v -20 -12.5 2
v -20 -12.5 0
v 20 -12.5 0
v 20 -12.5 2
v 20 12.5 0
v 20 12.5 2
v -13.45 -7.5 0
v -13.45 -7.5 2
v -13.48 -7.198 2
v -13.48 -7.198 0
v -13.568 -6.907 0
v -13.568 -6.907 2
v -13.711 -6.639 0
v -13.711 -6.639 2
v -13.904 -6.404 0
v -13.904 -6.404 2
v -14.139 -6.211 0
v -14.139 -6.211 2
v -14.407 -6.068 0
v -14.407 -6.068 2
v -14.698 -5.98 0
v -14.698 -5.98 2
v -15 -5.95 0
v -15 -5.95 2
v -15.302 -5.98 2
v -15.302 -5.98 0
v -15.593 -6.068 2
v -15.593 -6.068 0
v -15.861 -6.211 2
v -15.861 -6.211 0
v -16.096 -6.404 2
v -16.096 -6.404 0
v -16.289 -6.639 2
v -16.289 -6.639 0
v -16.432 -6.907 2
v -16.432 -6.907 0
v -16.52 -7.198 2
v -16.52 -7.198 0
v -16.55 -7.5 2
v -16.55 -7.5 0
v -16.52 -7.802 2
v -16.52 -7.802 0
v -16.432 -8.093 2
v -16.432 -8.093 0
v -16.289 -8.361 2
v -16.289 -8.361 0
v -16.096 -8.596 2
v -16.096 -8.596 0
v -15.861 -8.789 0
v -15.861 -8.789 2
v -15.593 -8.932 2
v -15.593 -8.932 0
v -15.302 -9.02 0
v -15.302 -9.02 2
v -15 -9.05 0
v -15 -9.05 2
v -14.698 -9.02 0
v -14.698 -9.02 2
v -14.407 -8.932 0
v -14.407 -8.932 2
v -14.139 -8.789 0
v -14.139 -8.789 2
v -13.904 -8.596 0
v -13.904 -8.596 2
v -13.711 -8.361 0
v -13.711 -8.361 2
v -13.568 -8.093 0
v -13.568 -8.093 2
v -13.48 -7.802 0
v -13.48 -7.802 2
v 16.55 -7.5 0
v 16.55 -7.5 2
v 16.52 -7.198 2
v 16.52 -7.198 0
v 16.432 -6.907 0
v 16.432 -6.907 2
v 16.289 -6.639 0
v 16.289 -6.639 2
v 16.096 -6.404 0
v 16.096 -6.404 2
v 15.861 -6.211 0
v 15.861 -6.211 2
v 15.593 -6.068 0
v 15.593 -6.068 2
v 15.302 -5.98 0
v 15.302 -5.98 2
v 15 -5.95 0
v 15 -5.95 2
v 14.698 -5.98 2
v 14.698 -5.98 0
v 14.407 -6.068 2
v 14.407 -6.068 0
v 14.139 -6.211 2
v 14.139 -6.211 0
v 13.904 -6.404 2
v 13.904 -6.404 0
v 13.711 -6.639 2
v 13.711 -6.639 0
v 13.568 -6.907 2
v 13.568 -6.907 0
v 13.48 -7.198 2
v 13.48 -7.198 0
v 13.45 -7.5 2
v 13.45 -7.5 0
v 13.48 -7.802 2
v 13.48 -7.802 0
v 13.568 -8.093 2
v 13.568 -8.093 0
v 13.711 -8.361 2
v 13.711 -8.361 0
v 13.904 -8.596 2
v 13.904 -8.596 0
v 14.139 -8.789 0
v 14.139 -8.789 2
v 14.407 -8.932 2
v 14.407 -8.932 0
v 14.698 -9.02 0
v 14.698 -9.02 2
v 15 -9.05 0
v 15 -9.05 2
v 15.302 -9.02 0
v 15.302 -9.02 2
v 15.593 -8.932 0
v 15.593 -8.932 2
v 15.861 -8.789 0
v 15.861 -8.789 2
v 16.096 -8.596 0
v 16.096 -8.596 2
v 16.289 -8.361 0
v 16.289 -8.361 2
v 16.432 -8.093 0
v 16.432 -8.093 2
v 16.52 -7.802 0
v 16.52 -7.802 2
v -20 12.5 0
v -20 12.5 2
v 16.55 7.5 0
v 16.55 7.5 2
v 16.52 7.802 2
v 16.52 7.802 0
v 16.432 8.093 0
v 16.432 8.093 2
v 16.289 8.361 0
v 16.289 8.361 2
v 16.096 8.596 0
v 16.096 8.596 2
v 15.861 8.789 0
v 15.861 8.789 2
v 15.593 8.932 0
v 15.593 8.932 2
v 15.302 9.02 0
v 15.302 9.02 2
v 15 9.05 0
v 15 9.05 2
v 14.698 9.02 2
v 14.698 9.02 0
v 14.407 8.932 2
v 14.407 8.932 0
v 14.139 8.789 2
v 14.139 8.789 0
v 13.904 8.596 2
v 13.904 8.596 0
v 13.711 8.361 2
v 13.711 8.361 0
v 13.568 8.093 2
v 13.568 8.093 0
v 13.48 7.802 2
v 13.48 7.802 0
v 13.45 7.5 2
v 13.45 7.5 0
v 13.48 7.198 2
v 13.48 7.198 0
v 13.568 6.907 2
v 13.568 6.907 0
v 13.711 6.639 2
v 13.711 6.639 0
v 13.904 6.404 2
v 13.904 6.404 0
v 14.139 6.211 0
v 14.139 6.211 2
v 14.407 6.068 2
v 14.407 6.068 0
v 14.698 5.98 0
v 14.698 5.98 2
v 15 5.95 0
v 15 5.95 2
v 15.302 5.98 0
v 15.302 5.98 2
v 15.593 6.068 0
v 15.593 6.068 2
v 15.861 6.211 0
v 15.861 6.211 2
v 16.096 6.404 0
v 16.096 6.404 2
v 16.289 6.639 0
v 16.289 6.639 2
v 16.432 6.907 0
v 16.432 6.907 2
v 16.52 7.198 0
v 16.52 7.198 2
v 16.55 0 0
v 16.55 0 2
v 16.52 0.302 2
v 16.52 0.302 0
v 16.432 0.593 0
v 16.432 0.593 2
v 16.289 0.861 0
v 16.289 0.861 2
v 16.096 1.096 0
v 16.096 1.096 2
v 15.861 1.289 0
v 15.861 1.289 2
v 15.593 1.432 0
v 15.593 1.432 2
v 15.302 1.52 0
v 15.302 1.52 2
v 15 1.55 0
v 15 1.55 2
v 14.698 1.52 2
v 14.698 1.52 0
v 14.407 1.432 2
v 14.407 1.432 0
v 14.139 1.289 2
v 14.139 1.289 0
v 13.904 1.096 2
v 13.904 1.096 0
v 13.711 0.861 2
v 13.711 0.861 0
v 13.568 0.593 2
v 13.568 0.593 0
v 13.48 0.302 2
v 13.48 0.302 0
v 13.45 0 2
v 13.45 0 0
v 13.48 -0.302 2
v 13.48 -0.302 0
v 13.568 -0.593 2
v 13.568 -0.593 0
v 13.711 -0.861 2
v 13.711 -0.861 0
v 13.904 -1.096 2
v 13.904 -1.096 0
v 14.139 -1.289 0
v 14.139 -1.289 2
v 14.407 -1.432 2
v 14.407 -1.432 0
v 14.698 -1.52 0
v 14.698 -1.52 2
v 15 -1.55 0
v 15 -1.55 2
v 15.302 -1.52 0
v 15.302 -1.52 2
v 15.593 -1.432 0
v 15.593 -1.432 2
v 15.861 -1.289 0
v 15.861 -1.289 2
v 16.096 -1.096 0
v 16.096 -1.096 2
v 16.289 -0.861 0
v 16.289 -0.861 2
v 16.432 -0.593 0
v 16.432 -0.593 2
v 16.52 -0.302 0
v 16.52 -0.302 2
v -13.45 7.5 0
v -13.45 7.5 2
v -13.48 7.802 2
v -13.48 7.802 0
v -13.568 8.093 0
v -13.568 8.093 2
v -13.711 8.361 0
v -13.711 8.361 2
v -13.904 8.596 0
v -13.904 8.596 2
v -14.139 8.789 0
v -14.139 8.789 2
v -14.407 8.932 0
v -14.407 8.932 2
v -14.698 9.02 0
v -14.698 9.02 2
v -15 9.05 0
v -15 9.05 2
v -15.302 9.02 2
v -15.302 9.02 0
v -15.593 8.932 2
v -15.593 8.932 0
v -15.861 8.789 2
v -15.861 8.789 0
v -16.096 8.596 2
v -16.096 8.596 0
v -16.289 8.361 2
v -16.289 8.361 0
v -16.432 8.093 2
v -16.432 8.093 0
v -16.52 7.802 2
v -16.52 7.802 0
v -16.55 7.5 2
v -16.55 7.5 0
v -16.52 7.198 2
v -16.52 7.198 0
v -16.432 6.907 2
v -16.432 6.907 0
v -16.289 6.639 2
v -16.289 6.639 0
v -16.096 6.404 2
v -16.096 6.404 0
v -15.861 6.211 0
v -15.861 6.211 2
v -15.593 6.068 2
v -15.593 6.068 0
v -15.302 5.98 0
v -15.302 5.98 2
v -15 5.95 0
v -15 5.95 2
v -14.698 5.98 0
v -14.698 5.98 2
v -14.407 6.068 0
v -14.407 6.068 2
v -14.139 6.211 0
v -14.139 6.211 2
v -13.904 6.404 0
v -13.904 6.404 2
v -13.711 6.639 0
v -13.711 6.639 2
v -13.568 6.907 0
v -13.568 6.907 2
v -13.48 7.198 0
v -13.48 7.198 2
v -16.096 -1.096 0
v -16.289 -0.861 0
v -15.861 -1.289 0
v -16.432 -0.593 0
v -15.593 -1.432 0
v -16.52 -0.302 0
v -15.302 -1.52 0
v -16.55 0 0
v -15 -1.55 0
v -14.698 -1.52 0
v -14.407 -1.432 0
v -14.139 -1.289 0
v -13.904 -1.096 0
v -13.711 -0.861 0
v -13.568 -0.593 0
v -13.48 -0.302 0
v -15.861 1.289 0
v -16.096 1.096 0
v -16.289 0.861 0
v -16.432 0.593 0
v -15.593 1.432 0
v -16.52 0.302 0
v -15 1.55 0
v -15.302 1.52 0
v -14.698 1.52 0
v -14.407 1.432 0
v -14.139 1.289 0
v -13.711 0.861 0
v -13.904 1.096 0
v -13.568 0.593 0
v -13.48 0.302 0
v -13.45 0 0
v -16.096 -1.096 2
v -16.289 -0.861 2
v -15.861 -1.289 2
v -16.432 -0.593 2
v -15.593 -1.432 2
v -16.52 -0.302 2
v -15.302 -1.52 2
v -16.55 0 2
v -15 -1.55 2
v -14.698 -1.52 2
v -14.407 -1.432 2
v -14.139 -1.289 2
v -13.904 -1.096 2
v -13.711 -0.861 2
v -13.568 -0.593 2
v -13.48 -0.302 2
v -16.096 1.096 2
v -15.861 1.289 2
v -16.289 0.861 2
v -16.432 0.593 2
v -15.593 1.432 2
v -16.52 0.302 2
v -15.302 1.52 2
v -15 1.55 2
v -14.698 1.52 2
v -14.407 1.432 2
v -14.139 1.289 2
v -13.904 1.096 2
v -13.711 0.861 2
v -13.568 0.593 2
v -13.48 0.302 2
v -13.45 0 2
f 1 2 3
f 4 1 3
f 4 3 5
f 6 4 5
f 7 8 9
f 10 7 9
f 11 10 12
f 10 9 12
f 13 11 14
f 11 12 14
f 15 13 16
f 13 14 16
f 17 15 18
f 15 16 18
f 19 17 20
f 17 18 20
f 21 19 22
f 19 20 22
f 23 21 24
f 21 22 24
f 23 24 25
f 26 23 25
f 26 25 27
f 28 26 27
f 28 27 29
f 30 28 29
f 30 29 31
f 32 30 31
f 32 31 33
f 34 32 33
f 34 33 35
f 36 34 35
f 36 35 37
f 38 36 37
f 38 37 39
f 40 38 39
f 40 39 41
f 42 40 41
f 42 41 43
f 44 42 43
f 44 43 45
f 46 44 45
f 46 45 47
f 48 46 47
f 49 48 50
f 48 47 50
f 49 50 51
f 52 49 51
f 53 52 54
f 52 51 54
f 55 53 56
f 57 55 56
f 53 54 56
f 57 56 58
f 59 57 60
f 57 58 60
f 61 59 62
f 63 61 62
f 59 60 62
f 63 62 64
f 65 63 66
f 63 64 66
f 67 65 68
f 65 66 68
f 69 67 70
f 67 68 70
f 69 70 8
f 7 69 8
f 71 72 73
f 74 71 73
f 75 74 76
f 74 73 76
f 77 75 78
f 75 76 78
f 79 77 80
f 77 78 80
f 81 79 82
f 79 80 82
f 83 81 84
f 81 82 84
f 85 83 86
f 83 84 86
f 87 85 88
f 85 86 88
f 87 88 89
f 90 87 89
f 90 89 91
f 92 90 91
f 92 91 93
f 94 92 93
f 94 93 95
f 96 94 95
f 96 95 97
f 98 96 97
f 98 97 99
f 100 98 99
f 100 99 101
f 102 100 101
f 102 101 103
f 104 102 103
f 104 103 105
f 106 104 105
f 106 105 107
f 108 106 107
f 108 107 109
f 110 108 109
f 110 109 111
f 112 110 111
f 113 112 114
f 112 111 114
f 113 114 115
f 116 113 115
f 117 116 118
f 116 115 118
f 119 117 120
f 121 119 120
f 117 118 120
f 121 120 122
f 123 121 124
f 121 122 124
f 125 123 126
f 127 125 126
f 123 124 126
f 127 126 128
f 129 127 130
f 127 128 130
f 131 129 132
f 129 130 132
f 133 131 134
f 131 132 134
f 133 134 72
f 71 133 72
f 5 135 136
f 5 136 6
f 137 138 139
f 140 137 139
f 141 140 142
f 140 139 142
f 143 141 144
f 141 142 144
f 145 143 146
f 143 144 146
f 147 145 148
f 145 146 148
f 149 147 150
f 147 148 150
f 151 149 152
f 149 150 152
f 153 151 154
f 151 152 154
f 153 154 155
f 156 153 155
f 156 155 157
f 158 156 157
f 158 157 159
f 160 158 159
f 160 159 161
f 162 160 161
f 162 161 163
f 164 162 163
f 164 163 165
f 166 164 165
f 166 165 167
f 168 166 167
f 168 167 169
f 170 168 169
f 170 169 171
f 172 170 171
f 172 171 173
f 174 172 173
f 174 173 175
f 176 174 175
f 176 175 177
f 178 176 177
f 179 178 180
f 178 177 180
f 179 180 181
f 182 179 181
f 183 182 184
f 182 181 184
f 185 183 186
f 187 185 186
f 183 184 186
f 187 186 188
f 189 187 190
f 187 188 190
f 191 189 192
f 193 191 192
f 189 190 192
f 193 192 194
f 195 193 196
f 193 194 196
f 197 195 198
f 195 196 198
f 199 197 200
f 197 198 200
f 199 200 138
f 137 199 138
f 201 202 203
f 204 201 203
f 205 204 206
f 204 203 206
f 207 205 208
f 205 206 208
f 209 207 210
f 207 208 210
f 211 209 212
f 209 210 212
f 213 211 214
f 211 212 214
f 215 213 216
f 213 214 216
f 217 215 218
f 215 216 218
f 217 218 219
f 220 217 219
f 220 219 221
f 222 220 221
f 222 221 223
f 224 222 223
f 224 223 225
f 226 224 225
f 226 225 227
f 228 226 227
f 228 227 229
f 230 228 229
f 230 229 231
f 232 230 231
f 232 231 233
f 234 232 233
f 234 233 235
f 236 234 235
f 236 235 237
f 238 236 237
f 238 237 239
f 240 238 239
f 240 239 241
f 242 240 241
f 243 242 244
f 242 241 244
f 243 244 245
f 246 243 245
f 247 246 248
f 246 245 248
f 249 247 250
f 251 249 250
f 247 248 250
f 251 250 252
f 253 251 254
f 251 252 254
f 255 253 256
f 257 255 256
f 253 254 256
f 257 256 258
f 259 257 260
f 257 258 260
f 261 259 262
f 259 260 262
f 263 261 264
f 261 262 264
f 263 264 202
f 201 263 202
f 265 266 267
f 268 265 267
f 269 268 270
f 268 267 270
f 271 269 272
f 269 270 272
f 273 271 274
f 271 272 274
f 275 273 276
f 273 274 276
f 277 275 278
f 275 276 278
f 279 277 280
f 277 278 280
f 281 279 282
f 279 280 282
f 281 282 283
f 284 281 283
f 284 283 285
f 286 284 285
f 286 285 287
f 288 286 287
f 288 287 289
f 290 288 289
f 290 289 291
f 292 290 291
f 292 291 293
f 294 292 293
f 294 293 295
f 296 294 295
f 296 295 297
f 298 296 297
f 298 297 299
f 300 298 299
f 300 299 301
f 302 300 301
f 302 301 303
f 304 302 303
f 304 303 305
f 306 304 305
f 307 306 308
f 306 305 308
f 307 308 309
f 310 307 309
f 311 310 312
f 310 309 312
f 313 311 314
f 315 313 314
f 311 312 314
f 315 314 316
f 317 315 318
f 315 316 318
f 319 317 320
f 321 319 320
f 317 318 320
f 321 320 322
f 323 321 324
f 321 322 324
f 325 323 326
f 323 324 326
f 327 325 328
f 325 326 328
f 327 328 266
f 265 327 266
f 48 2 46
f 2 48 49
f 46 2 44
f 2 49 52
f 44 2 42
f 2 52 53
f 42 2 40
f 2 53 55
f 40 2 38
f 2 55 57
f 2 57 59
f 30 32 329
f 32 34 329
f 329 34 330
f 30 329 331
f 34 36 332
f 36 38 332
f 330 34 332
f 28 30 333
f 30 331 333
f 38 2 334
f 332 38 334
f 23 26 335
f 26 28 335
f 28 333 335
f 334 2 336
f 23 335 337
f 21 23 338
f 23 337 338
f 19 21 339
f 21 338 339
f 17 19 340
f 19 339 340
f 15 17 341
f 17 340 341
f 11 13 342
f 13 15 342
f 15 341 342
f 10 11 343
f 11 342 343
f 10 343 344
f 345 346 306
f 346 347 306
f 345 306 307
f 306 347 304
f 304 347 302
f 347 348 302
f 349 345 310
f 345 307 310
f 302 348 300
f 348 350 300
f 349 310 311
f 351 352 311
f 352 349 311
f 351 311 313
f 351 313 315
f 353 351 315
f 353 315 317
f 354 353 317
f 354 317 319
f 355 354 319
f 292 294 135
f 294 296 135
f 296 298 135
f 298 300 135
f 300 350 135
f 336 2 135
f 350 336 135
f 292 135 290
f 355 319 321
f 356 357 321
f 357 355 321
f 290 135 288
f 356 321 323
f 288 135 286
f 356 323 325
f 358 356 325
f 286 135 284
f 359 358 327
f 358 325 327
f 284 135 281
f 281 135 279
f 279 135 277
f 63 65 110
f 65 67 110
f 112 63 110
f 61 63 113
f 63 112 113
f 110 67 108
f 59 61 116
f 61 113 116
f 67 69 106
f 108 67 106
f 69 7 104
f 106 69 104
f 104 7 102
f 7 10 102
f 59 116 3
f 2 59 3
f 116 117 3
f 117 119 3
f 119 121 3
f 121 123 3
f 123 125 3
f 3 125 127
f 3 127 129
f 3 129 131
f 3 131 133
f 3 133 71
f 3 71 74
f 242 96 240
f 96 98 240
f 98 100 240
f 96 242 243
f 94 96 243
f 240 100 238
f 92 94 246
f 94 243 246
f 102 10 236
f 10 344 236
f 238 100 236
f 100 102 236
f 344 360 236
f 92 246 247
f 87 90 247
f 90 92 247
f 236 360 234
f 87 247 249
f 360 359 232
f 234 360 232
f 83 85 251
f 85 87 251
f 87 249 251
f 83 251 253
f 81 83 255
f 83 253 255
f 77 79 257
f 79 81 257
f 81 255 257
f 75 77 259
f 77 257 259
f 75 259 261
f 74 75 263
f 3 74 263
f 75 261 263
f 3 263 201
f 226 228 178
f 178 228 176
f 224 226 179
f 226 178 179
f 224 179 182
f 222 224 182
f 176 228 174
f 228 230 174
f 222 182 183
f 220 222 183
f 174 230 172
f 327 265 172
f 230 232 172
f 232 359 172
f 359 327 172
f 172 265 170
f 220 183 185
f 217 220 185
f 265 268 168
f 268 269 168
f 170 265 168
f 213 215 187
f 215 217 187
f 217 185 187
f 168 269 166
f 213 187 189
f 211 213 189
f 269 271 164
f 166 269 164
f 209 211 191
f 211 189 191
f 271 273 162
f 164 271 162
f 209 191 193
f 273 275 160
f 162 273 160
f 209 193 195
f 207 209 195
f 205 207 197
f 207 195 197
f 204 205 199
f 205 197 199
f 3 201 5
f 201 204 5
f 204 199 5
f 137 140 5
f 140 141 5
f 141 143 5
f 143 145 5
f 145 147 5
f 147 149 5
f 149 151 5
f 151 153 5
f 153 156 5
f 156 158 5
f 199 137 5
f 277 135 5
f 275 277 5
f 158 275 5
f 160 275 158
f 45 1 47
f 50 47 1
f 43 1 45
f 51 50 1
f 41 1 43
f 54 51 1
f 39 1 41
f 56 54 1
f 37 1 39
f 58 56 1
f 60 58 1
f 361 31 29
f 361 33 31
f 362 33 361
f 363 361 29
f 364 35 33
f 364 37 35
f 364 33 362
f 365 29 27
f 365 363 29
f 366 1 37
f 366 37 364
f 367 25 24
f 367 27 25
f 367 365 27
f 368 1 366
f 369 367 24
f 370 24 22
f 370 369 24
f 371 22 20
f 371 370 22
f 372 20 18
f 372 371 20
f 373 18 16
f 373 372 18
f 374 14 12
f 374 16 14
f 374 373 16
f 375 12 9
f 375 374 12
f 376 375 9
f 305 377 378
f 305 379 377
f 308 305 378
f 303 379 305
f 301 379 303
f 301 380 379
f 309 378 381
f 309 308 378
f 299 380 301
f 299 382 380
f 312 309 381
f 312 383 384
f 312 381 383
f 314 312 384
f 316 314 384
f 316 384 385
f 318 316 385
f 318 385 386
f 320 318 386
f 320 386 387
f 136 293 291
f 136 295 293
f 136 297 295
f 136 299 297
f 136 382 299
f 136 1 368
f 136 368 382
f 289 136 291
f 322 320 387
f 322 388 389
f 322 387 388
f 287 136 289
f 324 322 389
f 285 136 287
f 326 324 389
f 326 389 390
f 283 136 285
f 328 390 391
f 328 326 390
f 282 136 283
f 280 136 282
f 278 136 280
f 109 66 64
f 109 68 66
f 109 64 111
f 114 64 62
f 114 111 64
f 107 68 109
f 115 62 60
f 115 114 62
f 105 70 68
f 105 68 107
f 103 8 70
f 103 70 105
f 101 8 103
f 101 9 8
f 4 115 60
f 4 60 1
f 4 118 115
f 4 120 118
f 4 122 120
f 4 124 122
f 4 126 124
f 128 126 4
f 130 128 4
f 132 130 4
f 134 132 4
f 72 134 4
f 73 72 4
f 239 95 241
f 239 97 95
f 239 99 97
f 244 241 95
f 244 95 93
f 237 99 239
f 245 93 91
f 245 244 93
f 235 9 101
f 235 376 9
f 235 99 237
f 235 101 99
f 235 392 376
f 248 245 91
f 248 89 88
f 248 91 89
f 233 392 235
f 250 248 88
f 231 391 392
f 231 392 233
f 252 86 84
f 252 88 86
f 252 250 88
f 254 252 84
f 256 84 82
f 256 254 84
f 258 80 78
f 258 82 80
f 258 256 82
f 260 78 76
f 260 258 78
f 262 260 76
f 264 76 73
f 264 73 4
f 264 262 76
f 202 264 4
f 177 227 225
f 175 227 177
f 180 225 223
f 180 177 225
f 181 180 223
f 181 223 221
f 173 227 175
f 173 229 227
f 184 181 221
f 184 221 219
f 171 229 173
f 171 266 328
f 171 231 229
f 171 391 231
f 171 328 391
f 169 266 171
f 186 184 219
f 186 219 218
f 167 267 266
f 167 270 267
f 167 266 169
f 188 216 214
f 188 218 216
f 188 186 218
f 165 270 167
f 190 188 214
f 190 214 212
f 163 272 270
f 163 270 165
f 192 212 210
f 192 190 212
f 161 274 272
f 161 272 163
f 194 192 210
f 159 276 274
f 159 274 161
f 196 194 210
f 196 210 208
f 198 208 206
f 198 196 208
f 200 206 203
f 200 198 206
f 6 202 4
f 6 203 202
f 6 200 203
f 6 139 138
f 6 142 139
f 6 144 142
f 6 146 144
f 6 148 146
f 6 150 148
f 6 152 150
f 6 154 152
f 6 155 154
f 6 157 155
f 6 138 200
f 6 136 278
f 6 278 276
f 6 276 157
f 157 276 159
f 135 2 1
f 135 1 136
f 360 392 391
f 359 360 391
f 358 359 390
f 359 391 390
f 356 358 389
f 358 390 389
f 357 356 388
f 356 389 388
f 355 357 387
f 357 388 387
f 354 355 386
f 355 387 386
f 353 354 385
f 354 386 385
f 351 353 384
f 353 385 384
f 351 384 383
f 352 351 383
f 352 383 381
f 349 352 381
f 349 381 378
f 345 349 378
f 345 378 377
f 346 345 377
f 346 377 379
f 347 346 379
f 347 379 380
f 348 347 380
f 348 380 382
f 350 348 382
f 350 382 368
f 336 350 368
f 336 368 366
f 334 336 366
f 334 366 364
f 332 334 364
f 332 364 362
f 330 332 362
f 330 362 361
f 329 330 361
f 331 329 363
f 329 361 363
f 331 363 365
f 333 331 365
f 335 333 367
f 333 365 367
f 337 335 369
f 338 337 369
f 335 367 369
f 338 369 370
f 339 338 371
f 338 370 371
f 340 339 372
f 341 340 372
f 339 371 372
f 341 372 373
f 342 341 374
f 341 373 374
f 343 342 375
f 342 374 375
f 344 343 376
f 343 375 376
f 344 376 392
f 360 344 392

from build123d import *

# Parameters (mm, degrees)
SKETCH1_W           = 40
SKETCH1_H           = 25
BOSS_EXTRUDE1_DEPTH = 2
CUT_EXTRUDE1_REACH  = 25.67
SKETCH2_R           = 1.55


with BuildPart() as part:
    # Sketch1 → Boss-Extrude1 (new body)
    with BuildSketch(Plane.XY):
        Rectangle(SKETCH1_W, SKETCH1_H)
    extrude(amount=BOSS_EXTRUDE1_DEPTH)

    # Sketch2 → Cut-Extrude1 (cut, up to next)
    with BuildSketch(Plane.XY.offset(2), mode=Mode.PRIVATE) as cut_extrude1_sk1:
        with Locations((-15, 7.5)):
            Circle(SKETCH2_R)
    cut_extrude1_tool1 = extrude(cut_extrude1_sk1.sketch, amount=-CUT_EXTRUDE1_REACH, mode=Mode.PRIVATE) & part.part
    # Sketch2 → Cut-Extrude1 (cut, up to next)
    with BuildSketch(Plane.XY.offset(2), mode=Mode.PRIVATE) as cut_extrude1_sk2:
        with Locations((-15, 0)):
            Circle(SKETCH2_R)
    cut_extrude1_tool2 = extrude(cut_extrude1_sk2.sketch, amount=-CUT_EXTRUDE1_REACH, mode=Mode.PRIVATE) & part.part
    # Sketch2 → Cut-Extrude1 (cut, up to next)
    with BuildSketch(Plane.XY.offset(2), mode=Mode.PRIVATE) as cut_extrude1_sk3:
        with Locations((-15, -7.5)):
            Circle(SKETCH2_R)
    cut_extrude1_tool3 = extrude(cut_extrude1_sk3.sketch, amount=-CUT_EXTRUDE1_REACH, mode=Mode.PRIVATE) & part.part
    # Sketch2 → Cut-Extrude1 (cut, up to next)
    with BuildSketch(Plane.XY.offset(2), mode=Mode.PRIVATE) as cut_extrude1_sk4:
        with Locations((15, -7.5)):
            Circle(SKETCH2_R)
    cut_extrude1_tool4 = extrude(cut_extrude1_sk4.sketch, amount=-CUT_EXTRUDE1_REACH, mode=Mode.PRIVATE) & part.part
    # Sketch2 → Cut-Extrude1 (cut, up to next)
    with BuildSketch(Plane.XY.offset(2), mode=Mode.PRIVATE) as cut_extrude1_sk5:
        with Locations((15, 0)):
            Circle(SKETCH2_R)
    cut_extrude1_tool5 = extrude(cut_extrude1_sk5.sketch, amount=-CUT_EXTRUDE1_REACH, mode=Mode.PRIVATE) & part.part
    # Sketch2 → Cut-Extrude1 (cut, up to next)
    with BuildSketch(Plane.XY.offset(2), mode=Mode.PRIVATE) as cut_extrude1_sk6:
        with Locations((15, 7.5)):
            Circle(SKETCH2_R)
    cut_extrude1_tool6 = extrude(cut_extrude1_sk6.sketch, amount=-CUT_EXTRUDE1_REACH, mode=Mode.PRIVATE) & part.part
    add(cut_extrude1_tool1.solids().sort_by_distance((-15, 7.5, 2))[0], mode=Mode.SUBTRACT)
    add(cut_extrude1_tool2.solids().sort_by_distance((-15, 0, 2))[0], mode=Mode.SUBTRACT)
    add(cut_extrude1_tool3.solids().sort_by_distance((-15, -7.5, 2))[0], mode=Mode.SUBTRACT)
    add(cut_extrude1_tool4.solids().sort_by_distance((15, -7.5, 2))[0], mode=Mode.SUBTRACT)
    add(cut_extrude1_tool5.solids().sort_by_distance((15, 0, 2))[0], mode=Mode.SUBTRACT)
    add(cut_extrude1_tool6.solids().sort_by_distance((15, 7.5, 2))[0], mode=Mode.SUBTRACT)


solid = part.part
